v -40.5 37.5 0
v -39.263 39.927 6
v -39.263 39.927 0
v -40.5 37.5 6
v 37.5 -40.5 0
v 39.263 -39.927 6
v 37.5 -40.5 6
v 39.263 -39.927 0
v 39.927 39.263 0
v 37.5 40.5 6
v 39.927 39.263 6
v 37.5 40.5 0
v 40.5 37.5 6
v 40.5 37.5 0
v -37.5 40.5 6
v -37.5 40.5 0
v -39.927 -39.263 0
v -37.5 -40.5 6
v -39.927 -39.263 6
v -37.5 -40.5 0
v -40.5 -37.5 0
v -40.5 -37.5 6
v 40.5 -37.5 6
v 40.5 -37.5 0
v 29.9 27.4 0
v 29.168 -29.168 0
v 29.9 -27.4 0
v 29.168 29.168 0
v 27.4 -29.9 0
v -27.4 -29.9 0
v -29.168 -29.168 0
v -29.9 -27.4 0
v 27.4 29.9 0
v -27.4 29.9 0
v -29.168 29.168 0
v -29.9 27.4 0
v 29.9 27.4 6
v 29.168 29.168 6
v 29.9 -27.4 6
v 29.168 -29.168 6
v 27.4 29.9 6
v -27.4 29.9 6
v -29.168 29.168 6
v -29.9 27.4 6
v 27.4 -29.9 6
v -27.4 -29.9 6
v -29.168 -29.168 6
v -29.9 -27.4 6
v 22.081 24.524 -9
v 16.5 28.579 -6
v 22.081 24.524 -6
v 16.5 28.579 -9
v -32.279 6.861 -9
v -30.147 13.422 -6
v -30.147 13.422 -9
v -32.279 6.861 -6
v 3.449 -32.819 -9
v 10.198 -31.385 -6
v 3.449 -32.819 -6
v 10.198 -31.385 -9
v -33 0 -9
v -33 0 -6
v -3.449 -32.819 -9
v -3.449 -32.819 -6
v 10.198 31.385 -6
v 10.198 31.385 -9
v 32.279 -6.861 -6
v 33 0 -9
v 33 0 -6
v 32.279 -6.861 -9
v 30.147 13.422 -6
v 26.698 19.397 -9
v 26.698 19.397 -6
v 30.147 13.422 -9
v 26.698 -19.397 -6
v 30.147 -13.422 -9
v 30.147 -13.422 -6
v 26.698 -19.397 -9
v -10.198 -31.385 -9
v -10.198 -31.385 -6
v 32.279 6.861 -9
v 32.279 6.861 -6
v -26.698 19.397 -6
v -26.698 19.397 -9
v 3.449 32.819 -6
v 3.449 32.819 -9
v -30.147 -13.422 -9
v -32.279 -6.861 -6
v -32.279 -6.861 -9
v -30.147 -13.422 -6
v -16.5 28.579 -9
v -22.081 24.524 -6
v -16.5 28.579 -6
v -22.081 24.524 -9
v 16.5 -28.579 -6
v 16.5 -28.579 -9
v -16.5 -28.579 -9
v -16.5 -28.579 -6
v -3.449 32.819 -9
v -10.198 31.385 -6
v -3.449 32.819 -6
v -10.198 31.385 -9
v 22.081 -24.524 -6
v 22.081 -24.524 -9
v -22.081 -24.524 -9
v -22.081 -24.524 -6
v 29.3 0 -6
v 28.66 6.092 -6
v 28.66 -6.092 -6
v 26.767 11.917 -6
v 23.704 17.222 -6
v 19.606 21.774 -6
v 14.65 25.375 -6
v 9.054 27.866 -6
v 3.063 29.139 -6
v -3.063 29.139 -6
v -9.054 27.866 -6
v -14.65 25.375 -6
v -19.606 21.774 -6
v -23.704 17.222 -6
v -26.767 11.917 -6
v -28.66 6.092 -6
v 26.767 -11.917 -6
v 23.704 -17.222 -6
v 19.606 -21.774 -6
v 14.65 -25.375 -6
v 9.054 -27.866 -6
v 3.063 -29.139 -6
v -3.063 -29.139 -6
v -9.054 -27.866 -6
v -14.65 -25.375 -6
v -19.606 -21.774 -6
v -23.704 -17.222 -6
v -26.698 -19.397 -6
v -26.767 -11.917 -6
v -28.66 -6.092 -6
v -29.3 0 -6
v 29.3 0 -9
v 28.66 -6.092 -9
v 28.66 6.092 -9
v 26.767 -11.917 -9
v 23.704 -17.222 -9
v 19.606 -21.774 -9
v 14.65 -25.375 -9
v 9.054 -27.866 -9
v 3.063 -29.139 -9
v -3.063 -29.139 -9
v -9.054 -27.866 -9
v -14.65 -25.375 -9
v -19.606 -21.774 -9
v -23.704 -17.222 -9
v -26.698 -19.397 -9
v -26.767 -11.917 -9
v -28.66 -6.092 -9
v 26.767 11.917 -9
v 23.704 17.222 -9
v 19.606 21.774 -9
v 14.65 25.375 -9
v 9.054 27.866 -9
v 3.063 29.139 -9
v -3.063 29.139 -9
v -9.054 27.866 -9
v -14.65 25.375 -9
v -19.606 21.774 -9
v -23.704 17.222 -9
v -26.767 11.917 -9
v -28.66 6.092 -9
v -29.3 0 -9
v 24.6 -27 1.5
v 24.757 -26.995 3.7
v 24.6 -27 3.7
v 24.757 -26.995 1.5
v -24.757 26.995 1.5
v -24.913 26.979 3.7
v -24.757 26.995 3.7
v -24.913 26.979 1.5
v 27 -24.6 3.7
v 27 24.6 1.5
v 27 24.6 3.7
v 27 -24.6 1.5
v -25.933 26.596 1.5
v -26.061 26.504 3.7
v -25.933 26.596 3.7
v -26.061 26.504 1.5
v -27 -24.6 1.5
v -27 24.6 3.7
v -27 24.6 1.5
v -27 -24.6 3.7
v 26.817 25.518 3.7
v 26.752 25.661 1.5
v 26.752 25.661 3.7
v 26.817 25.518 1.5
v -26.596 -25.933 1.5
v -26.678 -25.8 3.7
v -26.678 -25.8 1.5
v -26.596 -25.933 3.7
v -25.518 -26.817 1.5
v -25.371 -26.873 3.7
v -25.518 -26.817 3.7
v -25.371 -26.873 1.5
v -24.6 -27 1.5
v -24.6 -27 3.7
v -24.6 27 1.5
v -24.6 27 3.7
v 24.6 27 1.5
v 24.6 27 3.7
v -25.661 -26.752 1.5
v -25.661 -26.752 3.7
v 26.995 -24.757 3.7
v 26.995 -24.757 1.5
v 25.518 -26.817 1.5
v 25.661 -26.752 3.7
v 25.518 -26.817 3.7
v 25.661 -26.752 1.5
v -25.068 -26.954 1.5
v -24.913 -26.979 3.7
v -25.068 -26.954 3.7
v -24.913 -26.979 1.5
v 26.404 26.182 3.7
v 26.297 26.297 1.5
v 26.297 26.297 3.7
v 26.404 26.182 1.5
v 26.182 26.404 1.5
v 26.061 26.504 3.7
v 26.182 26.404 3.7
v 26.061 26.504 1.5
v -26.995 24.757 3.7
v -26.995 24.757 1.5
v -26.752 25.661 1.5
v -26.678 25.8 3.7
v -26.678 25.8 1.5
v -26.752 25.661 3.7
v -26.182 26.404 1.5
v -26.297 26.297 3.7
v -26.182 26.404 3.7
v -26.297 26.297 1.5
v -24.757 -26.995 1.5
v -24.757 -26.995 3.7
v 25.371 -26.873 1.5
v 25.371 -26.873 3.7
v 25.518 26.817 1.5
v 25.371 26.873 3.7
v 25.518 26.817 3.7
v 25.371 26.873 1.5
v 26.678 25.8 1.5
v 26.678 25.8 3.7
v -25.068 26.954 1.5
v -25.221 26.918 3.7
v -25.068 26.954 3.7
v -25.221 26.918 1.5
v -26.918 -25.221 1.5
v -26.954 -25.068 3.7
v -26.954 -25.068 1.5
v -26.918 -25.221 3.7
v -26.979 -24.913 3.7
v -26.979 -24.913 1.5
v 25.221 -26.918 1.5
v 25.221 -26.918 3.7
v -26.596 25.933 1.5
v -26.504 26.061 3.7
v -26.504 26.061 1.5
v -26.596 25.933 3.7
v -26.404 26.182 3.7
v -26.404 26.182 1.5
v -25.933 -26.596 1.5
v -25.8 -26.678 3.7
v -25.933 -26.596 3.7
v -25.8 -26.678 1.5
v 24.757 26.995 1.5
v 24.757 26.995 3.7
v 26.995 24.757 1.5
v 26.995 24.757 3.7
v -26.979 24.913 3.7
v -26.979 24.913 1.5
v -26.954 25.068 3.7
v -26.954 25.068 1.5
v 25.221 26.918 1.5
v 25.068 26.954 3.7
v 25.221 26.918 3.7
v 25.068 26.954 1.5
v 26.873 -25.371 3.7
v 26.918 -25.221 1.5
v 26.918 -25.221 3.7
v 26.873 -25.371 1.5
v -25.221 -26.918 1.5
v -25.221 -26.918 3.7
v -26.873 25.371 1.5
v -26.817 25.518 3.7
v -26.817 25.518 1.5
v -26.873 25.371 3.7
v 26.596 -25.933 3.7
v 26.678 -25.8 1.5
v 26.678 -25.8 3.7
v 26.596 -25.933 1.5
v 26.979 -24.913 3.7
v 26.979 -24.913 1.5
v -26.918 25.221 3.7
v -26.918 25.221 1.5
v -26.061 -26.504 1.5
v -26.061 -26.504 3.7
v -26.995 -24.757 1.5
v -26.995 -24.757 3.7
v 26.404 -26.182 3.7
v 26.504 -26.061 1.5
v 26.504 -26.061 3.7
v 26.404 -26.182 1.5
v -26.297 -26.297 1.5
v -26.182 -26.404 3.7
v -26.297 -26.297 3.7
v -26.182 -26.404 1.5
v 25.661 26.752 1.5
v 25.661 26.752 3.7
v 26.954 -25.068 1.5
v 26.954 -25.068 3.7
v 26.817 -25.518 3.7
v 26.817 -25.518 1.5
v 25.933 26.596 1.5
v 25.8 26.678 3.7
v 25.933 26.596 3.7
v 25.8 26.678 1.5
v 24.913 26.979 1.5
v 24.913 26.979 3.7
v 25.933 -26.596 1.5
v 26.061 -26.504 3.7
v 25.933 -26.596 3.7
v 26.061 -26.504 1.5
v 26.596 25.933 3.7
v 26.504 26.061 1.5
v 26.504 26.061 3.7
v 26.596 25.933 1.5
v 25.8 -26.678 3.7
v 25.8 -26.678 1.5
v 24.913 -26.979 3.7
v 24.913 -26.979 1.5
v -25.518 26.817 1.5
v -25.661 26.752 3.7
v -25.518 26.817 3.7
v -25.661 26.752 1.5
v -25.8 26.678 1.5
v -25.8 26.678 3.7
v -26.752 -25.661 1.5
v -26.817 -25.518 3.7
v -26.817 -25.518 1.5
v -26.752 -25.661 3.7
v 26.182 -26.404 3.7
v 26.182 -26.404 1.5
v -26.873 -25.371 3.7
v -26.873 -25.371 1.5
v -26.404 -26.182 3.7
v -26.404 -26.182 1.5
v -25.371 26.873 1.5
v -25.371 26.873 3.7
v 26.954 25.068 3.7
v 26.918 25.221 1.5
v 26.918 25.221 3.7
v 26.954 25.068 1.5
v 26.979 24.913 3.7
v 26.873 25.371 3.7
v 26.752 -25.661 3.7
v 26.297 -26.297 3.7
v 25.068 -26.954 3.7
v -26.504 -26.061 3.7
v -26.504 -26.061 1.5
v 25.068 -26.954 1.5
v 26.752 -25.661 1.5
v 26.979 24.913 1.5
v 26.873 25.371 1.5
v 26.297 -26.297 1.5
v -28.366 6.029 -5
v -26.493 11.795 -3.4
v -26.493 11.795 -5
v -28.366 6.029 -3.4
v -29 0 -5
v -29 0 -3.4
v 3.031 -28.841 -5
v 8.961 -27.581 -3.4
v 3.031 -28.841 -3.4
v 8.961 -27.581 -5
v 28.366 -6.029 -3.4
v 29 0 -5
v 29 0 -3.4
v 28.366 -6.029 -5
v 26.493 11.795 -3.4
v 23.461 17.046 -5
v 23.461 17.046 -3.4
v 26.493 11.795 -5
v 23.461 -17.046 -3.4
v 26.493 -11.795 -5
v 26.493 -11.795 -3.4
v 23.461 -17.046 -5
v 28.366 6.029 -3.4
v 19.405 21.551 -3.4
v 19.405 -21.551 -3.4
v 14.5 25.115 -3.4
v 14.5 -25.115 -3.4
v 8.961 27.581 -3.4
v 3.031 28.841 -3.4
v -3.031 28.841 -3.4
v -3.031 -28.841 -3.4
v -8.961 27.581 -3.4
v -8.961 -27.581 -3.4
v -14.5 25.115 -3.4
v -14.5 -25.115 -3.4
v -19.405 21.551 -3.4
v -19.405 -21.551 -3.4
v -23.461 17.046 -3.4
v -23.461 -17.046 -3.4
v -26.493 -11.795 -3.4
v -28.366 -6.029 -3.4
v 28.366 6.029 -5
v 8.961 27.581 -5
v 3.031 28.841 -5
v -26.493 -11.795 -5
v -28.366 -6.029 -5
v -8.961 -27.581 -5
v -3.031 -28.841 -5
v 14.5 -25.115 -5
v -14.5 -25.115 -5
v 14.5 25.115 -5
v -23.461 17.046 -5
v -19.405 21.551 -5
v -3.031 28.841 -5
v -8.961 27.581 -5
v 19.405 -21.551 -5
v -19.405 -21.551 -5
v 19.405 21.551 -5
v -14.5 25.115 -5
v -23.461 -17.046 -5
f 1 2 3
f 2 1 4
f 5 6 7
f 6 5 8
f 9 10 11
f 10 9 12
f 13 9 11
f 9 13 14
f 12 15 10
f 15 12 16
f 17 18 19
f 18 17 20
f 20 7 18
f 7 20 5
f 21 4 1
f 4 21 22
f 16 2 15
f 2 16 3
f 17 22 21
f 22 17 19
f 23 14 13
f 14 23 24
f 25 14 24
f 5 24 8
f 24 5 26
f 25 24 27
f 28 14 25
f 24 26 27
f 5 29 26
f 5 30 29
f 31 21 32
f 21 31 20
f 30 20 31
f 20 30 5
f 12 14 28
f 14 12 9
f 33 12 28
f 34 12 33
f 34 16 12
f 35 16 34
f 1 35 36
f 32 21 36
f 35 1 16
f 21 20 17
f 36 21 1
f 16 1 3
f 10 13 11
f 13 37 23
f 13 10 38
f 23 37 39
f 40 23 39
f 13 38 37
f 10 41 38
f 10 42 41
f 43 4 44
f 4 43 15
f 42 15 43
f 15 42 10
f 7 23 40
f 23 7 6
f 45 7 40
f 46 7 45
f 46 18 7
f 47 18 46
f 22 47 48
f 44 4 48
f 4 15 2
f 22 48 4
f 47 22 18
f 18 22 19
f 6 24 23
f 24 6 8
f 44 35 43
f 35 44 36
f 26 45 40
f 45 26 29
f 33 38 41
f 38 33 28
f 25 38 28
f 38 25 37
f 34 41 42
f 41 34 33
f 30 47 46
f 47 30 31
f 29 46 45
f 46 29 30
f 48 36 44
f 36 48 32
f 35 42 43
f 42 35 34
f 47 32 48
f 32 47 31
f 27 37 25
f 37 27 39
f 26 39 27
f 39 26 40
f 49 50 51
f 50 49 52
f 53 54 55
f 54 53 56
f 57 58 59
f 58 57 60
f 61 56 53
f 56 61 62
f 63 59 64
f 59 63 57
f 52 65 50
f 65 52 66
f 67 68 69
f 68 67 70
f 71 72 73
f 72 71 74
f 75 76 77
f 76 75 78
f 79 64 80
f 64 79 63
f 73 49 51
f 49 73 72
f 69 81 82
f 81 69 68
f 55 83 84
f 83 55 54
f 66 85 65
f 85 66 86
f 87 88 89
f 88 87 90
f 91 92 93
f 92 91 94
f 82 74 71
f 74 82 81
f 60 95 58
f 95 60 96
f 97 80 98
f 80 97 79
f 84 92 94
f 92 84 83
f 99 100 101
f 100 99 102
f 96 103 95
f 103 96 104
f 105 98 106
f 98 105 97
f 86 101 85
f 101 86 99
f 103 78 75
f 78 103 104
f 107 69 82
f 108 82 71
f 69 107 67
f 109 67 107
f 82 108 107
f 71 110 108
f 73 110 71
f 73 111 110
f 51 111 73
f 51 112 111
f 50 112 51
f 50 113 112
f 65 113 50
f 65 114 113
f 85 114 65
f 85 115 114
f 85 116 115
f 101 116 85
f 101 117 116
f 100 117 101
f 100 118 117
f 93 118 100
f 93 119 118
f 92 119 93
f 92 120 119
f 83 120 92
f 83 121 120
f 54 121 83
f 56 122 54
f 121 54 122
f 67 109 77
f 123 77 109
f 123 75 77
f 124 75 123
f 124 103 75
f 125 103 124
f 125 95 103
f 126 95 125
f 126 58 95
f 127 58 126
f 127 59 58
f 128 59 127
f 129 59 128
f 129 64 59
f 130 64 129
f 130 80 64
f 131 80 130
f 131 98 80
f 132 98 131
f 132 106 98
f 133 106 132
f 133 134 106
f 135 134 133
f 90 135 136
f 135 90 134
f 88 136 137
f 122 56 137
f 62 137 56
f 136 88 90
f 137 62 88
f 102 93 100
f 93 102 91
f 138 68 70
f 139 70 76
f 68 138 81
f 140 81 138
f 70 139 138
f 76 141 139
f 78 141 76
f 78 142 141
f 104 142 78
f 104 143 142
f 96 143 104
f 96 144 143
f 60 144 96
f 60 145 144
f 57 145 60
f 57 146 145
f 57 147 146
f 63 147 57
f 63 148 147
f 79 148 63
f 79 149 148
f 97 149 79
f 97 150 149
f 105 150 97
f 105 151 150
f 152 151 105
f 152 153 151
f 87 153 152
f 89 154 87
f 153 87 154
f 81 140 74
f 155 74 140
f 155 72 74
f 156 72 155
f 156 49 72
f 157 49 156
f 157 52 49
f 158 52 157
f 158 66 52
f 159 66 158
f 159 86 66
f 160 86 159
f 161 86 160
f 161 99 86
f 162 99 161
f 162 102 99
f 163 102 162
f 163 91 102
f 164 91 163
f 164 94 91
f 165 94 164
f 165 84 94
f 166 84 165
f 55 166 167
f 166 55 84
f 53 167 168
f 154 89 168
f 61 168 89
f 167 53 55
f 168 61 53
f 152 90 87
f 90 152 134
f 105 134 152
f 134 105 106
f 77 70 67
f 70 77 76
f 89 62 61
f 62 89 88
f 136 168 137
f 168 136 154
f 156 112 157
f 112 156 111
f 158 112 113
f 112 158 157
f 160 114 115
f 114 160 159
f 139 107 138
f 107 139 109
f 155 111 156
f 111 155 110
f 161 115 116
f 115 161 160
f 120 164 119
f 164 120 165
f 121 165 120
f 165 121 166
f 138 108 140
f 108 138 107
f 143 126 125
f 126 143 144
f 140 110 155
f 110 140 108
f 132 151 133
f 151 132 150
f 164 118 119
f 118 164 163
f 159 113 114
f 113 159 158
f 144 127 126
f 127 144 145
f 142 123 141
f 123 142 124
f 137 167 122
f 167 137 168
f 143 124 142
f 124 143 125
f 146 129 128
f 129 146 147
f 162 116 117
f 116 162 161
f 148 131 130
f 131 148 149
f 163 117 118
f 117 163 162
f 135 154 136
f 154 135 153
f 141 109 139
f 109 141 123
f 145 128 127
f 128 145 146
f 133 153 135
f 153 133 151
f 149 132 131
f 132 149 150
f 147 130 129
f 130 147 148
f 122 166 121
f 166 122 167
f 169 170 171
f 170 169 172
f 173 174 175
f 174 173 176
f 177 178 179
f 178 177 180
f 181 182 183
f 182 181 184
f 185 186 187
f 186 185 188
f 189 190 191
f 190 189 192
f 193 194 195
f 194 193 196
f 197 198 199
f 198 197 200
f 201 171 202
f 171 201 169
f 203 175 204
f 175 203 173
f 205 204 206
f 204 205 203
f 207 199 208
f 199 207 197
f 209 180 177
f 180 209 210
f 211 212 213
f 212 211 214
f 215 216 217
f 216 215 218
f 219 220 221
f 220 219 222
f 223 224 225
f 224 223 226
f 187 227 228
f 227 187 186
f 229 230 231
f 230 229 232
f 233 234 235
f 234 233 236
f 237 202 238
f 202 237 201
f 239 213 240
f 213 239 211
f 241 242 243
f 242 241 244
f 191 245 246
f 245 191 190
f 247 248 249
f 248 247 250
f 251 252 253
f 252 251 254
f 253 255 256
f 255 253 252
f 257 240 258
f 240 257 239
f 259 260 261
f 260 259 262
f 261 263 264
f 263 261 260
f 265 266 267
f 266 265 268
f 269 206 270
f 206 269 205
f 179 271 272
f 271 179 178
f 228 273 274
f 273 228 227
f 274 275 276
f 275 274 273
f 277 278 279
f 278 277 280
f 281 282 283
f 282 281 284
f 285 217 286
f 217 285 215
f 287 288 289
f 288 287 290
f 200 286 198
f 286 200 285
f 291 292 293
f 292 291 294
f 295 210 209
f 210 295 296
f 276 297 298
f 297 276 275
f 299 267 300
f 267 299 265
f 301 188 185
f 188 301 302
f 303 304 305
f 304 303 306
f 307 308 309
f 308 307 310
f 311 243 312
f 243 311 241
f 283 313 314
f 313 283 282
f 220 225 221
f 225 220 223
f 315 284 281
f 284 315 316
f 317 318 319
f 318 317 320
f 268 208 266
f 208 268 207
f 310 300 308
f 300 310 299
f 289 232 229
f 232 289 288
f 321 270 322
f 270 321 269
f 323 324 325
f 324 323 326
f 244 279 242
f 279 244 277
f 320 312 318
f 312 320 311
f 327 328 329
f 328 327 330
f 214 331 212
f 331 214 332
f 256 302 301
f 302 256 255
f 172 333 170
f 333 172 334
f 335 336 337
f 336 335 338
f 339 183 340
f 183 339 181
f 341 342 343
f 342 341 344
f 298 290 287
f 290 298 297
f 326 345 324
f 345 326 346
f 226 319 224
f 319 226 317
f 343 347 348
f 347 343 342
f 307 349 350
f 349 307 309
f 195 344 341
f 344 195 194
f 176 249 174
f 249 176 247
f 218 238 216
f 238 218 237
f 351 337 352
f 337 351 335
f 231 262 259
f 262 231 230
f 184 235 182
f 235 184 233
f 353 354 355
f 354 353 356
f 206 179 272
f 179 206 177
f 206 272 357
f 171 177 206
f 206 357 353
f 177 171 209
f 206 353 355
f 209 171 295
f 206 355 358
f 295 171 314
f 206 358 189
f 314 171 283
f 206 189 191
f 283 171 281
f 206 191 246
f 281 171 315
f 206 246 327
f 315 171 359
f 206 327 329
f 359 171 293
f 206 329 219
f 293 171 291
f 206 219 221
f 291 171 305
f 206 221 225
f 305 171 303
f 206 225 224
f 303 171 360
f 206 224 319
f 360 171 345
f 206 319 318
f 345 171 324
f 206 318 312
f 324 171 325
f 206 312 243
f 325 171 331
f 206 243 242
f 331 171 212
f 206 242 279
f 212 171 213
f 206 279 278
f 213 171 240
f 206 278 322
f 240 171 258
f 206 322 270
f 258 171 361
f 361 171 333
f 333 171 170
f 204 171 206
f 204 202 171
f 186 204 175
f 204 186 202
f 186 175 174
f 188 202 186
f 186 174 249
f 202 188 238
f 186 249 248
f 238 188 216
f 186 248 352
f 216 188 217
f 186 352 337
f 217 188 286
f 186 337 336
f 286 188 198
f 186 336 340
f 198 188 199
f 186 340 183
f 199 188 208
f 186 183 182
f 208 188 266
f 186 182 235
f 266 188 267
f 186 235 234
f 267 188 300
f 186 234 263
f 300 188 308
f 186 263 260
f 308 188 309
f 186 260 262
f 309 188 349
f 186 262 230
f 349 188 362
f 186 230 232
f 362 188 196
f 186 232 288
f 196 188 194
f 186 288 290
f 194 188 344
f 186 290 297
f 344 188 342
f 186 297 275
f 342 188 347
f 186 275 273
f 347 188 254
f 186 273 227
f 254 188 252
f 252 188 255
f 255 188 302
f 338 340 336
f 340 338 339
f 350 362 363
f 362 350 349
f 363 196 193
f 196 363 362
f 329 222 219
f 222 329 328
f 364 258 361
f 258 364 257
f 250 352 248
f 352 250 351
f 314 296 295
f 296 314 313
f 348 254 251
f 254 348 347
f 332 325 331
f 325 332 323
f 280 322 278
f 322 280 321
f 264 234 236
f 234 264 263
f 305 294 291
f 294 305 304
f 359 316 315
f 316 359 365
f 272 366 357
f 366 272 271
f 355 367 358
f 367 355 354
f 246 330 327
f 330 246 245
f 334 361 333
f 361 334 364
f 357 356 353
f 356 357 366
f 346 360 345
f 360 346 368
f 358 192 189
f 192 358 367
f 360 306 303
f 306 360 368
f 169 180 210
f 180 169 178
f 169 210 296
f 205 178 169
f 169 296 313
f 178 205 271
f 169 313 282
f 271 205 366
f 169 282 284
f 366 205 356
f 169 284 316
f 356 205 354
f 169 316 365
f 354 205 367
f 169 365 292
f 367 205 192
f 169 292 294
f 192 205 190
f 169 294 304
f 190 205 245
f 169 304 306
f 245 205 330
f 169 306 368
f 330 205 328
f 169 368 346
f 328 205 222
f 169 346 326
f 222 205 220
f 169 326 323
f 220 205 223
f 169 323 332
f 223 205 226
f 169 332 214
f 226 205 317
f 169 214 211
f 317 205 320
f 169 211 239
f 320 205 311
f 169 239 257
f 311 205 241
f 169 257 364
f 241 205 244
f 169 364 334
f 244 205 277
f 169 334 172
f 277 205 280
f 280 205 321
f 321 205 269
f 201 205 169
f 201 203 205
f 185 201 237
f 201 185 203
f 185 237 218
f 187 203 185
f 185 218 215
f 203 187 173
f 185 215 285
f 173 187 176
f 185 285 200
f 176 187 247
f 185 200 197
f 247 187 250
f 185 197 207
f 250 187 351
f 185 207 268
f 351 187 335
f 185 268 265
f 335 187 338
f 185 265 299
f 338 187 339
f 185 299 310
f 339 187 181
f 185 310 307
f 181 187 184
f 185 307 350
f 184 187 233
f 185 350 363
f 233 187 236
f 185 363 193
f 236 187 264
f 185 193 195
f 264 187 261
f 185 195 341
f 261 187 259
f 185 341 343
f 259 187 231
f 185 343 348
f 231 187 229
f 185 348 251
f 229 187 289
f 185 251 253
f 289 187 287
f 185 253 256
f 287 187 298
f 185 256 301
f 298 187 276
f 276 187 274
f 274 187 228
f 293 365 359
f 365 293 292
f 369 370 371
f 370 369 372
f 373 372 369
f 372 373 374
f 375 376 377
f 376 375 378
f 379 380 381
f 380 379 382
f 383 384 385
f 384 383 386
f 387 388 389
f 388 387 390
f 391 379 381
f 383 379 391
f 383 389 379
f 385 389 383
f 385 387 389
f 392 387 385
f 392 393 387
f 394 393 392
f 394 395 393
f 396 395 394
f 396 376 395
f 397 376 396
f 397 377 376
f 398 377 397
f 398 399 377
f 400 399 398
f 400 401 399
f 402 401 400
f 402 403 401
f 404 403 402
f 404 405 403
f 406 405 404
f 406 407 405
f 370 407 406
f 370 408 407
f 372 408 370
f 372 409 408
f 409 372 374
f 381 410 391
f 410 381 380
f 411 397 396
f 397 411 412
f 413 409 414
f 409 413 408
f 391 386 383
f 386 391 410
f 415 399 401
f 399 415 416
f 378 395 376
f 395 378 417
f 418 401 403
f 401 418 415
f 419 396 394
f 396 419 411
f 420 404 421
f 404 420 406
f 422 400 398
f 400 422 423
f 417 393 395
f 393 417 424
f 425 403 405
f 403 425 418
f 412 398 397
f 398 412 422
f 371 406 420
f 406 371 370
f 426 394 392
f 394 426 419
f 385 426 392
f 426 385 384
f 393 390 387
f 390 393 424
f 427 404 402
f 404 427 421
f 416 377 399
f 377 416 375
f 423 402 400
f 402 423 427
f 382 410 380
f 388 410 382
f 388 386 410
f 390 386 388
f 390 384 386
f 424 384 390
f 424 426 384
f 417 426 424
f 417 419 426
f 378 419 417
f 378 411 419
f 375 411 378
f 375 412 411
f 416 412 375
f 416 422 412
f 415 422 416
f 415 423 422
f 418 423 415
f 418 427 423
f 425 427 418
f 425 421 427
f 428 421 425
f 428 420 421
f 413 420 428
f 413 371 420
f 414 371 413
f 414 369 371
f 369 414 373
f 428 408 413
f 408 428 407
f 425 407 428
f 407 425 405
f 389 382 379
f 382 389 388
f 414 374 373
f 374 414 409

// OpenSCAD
// file: pcb_carrier.scad
// WallKnob-C6 Rev A - PCB carrier for Ø58 mm board
// Supports PCB at 3 points, matching Rev A mounting holes (radius 24 mm, 120 degrees)
$fn=96;
outer_d=66;
inner_d=58.6;
carrier_h=3.0;
ear_r=4.5;
hole_d=2.8;
mount_r=24;

module ear(a){
  rotate([0,0,a]) translate([mount_r,0,0]) cylinder(r=ear_r,h=carrier_h);
}

difference(){
  union(){
    difference(){
      cylinder(d=outer_d,h=carrier_h);
      translate([0,0,-0.1]) cylinder(d=inner_d,h=carrier_h+0.2);
    }
    ear(-90); ear(30); ear(150);
  }
  for(a=[-90,30,150])
    rotate([0,0,a]) translate([mount_r,0,-0.1]) cylinder(d=hole_d,h=carrier_h+0.2);
}
// file: si_centerplate.scad
// WallKnob-C6 Rev A - Busch-Jaeger Reflex SI compatible center plate
// Nominal Reflex SI cover size: 54 x 54 mm. Verify against your physical frame.
$fn=96;
plate=54;
th=2.2;
corner_r=2.4;
shaft_hole=7.2;
recess_d=17.0;
recess_depth=0.7;

module rounded_square(size,r,h){
  linear_extrude(height=h)
    offset(r=r) square([size-2*r,size-2*r],center=true);
}

difference(){
  rounded_square(plate,corner_r,th);
  translate([0,0,-0.1]) cylinder(d=shaft_hole,h=th+0.2);
  translate([0,0,th-recess_depth]) cylinder(d=recess_d,h=recess_depth+0.1);
}
// main file
// Visual-only assembly preview for WallKnob-C6 + Reflex SI front
use <si_centerplate.scad>
use <pcb_carrier.scad>

module frame_preview(){
  difference(){
    color("white") linear_extrude(6) offset(r=3) square([75,75],center=true);
    translate([0,0,-0.1]) linear_extrude(6.2) offset(r=2.5) square([54.8,54.8],center=true);
  }
}
frame_preview();
translate([0,0,1.5]) color("ivory") rounded_square(54,2.4,2.2);
translate([0,0,-5]) color("gray") cylinder(d=58,h=1.6);
translate([0,0,-9]) color("orange") difference(){cylinder(d=66,h=3); cylinder(d=58.6,h=3.2);}
